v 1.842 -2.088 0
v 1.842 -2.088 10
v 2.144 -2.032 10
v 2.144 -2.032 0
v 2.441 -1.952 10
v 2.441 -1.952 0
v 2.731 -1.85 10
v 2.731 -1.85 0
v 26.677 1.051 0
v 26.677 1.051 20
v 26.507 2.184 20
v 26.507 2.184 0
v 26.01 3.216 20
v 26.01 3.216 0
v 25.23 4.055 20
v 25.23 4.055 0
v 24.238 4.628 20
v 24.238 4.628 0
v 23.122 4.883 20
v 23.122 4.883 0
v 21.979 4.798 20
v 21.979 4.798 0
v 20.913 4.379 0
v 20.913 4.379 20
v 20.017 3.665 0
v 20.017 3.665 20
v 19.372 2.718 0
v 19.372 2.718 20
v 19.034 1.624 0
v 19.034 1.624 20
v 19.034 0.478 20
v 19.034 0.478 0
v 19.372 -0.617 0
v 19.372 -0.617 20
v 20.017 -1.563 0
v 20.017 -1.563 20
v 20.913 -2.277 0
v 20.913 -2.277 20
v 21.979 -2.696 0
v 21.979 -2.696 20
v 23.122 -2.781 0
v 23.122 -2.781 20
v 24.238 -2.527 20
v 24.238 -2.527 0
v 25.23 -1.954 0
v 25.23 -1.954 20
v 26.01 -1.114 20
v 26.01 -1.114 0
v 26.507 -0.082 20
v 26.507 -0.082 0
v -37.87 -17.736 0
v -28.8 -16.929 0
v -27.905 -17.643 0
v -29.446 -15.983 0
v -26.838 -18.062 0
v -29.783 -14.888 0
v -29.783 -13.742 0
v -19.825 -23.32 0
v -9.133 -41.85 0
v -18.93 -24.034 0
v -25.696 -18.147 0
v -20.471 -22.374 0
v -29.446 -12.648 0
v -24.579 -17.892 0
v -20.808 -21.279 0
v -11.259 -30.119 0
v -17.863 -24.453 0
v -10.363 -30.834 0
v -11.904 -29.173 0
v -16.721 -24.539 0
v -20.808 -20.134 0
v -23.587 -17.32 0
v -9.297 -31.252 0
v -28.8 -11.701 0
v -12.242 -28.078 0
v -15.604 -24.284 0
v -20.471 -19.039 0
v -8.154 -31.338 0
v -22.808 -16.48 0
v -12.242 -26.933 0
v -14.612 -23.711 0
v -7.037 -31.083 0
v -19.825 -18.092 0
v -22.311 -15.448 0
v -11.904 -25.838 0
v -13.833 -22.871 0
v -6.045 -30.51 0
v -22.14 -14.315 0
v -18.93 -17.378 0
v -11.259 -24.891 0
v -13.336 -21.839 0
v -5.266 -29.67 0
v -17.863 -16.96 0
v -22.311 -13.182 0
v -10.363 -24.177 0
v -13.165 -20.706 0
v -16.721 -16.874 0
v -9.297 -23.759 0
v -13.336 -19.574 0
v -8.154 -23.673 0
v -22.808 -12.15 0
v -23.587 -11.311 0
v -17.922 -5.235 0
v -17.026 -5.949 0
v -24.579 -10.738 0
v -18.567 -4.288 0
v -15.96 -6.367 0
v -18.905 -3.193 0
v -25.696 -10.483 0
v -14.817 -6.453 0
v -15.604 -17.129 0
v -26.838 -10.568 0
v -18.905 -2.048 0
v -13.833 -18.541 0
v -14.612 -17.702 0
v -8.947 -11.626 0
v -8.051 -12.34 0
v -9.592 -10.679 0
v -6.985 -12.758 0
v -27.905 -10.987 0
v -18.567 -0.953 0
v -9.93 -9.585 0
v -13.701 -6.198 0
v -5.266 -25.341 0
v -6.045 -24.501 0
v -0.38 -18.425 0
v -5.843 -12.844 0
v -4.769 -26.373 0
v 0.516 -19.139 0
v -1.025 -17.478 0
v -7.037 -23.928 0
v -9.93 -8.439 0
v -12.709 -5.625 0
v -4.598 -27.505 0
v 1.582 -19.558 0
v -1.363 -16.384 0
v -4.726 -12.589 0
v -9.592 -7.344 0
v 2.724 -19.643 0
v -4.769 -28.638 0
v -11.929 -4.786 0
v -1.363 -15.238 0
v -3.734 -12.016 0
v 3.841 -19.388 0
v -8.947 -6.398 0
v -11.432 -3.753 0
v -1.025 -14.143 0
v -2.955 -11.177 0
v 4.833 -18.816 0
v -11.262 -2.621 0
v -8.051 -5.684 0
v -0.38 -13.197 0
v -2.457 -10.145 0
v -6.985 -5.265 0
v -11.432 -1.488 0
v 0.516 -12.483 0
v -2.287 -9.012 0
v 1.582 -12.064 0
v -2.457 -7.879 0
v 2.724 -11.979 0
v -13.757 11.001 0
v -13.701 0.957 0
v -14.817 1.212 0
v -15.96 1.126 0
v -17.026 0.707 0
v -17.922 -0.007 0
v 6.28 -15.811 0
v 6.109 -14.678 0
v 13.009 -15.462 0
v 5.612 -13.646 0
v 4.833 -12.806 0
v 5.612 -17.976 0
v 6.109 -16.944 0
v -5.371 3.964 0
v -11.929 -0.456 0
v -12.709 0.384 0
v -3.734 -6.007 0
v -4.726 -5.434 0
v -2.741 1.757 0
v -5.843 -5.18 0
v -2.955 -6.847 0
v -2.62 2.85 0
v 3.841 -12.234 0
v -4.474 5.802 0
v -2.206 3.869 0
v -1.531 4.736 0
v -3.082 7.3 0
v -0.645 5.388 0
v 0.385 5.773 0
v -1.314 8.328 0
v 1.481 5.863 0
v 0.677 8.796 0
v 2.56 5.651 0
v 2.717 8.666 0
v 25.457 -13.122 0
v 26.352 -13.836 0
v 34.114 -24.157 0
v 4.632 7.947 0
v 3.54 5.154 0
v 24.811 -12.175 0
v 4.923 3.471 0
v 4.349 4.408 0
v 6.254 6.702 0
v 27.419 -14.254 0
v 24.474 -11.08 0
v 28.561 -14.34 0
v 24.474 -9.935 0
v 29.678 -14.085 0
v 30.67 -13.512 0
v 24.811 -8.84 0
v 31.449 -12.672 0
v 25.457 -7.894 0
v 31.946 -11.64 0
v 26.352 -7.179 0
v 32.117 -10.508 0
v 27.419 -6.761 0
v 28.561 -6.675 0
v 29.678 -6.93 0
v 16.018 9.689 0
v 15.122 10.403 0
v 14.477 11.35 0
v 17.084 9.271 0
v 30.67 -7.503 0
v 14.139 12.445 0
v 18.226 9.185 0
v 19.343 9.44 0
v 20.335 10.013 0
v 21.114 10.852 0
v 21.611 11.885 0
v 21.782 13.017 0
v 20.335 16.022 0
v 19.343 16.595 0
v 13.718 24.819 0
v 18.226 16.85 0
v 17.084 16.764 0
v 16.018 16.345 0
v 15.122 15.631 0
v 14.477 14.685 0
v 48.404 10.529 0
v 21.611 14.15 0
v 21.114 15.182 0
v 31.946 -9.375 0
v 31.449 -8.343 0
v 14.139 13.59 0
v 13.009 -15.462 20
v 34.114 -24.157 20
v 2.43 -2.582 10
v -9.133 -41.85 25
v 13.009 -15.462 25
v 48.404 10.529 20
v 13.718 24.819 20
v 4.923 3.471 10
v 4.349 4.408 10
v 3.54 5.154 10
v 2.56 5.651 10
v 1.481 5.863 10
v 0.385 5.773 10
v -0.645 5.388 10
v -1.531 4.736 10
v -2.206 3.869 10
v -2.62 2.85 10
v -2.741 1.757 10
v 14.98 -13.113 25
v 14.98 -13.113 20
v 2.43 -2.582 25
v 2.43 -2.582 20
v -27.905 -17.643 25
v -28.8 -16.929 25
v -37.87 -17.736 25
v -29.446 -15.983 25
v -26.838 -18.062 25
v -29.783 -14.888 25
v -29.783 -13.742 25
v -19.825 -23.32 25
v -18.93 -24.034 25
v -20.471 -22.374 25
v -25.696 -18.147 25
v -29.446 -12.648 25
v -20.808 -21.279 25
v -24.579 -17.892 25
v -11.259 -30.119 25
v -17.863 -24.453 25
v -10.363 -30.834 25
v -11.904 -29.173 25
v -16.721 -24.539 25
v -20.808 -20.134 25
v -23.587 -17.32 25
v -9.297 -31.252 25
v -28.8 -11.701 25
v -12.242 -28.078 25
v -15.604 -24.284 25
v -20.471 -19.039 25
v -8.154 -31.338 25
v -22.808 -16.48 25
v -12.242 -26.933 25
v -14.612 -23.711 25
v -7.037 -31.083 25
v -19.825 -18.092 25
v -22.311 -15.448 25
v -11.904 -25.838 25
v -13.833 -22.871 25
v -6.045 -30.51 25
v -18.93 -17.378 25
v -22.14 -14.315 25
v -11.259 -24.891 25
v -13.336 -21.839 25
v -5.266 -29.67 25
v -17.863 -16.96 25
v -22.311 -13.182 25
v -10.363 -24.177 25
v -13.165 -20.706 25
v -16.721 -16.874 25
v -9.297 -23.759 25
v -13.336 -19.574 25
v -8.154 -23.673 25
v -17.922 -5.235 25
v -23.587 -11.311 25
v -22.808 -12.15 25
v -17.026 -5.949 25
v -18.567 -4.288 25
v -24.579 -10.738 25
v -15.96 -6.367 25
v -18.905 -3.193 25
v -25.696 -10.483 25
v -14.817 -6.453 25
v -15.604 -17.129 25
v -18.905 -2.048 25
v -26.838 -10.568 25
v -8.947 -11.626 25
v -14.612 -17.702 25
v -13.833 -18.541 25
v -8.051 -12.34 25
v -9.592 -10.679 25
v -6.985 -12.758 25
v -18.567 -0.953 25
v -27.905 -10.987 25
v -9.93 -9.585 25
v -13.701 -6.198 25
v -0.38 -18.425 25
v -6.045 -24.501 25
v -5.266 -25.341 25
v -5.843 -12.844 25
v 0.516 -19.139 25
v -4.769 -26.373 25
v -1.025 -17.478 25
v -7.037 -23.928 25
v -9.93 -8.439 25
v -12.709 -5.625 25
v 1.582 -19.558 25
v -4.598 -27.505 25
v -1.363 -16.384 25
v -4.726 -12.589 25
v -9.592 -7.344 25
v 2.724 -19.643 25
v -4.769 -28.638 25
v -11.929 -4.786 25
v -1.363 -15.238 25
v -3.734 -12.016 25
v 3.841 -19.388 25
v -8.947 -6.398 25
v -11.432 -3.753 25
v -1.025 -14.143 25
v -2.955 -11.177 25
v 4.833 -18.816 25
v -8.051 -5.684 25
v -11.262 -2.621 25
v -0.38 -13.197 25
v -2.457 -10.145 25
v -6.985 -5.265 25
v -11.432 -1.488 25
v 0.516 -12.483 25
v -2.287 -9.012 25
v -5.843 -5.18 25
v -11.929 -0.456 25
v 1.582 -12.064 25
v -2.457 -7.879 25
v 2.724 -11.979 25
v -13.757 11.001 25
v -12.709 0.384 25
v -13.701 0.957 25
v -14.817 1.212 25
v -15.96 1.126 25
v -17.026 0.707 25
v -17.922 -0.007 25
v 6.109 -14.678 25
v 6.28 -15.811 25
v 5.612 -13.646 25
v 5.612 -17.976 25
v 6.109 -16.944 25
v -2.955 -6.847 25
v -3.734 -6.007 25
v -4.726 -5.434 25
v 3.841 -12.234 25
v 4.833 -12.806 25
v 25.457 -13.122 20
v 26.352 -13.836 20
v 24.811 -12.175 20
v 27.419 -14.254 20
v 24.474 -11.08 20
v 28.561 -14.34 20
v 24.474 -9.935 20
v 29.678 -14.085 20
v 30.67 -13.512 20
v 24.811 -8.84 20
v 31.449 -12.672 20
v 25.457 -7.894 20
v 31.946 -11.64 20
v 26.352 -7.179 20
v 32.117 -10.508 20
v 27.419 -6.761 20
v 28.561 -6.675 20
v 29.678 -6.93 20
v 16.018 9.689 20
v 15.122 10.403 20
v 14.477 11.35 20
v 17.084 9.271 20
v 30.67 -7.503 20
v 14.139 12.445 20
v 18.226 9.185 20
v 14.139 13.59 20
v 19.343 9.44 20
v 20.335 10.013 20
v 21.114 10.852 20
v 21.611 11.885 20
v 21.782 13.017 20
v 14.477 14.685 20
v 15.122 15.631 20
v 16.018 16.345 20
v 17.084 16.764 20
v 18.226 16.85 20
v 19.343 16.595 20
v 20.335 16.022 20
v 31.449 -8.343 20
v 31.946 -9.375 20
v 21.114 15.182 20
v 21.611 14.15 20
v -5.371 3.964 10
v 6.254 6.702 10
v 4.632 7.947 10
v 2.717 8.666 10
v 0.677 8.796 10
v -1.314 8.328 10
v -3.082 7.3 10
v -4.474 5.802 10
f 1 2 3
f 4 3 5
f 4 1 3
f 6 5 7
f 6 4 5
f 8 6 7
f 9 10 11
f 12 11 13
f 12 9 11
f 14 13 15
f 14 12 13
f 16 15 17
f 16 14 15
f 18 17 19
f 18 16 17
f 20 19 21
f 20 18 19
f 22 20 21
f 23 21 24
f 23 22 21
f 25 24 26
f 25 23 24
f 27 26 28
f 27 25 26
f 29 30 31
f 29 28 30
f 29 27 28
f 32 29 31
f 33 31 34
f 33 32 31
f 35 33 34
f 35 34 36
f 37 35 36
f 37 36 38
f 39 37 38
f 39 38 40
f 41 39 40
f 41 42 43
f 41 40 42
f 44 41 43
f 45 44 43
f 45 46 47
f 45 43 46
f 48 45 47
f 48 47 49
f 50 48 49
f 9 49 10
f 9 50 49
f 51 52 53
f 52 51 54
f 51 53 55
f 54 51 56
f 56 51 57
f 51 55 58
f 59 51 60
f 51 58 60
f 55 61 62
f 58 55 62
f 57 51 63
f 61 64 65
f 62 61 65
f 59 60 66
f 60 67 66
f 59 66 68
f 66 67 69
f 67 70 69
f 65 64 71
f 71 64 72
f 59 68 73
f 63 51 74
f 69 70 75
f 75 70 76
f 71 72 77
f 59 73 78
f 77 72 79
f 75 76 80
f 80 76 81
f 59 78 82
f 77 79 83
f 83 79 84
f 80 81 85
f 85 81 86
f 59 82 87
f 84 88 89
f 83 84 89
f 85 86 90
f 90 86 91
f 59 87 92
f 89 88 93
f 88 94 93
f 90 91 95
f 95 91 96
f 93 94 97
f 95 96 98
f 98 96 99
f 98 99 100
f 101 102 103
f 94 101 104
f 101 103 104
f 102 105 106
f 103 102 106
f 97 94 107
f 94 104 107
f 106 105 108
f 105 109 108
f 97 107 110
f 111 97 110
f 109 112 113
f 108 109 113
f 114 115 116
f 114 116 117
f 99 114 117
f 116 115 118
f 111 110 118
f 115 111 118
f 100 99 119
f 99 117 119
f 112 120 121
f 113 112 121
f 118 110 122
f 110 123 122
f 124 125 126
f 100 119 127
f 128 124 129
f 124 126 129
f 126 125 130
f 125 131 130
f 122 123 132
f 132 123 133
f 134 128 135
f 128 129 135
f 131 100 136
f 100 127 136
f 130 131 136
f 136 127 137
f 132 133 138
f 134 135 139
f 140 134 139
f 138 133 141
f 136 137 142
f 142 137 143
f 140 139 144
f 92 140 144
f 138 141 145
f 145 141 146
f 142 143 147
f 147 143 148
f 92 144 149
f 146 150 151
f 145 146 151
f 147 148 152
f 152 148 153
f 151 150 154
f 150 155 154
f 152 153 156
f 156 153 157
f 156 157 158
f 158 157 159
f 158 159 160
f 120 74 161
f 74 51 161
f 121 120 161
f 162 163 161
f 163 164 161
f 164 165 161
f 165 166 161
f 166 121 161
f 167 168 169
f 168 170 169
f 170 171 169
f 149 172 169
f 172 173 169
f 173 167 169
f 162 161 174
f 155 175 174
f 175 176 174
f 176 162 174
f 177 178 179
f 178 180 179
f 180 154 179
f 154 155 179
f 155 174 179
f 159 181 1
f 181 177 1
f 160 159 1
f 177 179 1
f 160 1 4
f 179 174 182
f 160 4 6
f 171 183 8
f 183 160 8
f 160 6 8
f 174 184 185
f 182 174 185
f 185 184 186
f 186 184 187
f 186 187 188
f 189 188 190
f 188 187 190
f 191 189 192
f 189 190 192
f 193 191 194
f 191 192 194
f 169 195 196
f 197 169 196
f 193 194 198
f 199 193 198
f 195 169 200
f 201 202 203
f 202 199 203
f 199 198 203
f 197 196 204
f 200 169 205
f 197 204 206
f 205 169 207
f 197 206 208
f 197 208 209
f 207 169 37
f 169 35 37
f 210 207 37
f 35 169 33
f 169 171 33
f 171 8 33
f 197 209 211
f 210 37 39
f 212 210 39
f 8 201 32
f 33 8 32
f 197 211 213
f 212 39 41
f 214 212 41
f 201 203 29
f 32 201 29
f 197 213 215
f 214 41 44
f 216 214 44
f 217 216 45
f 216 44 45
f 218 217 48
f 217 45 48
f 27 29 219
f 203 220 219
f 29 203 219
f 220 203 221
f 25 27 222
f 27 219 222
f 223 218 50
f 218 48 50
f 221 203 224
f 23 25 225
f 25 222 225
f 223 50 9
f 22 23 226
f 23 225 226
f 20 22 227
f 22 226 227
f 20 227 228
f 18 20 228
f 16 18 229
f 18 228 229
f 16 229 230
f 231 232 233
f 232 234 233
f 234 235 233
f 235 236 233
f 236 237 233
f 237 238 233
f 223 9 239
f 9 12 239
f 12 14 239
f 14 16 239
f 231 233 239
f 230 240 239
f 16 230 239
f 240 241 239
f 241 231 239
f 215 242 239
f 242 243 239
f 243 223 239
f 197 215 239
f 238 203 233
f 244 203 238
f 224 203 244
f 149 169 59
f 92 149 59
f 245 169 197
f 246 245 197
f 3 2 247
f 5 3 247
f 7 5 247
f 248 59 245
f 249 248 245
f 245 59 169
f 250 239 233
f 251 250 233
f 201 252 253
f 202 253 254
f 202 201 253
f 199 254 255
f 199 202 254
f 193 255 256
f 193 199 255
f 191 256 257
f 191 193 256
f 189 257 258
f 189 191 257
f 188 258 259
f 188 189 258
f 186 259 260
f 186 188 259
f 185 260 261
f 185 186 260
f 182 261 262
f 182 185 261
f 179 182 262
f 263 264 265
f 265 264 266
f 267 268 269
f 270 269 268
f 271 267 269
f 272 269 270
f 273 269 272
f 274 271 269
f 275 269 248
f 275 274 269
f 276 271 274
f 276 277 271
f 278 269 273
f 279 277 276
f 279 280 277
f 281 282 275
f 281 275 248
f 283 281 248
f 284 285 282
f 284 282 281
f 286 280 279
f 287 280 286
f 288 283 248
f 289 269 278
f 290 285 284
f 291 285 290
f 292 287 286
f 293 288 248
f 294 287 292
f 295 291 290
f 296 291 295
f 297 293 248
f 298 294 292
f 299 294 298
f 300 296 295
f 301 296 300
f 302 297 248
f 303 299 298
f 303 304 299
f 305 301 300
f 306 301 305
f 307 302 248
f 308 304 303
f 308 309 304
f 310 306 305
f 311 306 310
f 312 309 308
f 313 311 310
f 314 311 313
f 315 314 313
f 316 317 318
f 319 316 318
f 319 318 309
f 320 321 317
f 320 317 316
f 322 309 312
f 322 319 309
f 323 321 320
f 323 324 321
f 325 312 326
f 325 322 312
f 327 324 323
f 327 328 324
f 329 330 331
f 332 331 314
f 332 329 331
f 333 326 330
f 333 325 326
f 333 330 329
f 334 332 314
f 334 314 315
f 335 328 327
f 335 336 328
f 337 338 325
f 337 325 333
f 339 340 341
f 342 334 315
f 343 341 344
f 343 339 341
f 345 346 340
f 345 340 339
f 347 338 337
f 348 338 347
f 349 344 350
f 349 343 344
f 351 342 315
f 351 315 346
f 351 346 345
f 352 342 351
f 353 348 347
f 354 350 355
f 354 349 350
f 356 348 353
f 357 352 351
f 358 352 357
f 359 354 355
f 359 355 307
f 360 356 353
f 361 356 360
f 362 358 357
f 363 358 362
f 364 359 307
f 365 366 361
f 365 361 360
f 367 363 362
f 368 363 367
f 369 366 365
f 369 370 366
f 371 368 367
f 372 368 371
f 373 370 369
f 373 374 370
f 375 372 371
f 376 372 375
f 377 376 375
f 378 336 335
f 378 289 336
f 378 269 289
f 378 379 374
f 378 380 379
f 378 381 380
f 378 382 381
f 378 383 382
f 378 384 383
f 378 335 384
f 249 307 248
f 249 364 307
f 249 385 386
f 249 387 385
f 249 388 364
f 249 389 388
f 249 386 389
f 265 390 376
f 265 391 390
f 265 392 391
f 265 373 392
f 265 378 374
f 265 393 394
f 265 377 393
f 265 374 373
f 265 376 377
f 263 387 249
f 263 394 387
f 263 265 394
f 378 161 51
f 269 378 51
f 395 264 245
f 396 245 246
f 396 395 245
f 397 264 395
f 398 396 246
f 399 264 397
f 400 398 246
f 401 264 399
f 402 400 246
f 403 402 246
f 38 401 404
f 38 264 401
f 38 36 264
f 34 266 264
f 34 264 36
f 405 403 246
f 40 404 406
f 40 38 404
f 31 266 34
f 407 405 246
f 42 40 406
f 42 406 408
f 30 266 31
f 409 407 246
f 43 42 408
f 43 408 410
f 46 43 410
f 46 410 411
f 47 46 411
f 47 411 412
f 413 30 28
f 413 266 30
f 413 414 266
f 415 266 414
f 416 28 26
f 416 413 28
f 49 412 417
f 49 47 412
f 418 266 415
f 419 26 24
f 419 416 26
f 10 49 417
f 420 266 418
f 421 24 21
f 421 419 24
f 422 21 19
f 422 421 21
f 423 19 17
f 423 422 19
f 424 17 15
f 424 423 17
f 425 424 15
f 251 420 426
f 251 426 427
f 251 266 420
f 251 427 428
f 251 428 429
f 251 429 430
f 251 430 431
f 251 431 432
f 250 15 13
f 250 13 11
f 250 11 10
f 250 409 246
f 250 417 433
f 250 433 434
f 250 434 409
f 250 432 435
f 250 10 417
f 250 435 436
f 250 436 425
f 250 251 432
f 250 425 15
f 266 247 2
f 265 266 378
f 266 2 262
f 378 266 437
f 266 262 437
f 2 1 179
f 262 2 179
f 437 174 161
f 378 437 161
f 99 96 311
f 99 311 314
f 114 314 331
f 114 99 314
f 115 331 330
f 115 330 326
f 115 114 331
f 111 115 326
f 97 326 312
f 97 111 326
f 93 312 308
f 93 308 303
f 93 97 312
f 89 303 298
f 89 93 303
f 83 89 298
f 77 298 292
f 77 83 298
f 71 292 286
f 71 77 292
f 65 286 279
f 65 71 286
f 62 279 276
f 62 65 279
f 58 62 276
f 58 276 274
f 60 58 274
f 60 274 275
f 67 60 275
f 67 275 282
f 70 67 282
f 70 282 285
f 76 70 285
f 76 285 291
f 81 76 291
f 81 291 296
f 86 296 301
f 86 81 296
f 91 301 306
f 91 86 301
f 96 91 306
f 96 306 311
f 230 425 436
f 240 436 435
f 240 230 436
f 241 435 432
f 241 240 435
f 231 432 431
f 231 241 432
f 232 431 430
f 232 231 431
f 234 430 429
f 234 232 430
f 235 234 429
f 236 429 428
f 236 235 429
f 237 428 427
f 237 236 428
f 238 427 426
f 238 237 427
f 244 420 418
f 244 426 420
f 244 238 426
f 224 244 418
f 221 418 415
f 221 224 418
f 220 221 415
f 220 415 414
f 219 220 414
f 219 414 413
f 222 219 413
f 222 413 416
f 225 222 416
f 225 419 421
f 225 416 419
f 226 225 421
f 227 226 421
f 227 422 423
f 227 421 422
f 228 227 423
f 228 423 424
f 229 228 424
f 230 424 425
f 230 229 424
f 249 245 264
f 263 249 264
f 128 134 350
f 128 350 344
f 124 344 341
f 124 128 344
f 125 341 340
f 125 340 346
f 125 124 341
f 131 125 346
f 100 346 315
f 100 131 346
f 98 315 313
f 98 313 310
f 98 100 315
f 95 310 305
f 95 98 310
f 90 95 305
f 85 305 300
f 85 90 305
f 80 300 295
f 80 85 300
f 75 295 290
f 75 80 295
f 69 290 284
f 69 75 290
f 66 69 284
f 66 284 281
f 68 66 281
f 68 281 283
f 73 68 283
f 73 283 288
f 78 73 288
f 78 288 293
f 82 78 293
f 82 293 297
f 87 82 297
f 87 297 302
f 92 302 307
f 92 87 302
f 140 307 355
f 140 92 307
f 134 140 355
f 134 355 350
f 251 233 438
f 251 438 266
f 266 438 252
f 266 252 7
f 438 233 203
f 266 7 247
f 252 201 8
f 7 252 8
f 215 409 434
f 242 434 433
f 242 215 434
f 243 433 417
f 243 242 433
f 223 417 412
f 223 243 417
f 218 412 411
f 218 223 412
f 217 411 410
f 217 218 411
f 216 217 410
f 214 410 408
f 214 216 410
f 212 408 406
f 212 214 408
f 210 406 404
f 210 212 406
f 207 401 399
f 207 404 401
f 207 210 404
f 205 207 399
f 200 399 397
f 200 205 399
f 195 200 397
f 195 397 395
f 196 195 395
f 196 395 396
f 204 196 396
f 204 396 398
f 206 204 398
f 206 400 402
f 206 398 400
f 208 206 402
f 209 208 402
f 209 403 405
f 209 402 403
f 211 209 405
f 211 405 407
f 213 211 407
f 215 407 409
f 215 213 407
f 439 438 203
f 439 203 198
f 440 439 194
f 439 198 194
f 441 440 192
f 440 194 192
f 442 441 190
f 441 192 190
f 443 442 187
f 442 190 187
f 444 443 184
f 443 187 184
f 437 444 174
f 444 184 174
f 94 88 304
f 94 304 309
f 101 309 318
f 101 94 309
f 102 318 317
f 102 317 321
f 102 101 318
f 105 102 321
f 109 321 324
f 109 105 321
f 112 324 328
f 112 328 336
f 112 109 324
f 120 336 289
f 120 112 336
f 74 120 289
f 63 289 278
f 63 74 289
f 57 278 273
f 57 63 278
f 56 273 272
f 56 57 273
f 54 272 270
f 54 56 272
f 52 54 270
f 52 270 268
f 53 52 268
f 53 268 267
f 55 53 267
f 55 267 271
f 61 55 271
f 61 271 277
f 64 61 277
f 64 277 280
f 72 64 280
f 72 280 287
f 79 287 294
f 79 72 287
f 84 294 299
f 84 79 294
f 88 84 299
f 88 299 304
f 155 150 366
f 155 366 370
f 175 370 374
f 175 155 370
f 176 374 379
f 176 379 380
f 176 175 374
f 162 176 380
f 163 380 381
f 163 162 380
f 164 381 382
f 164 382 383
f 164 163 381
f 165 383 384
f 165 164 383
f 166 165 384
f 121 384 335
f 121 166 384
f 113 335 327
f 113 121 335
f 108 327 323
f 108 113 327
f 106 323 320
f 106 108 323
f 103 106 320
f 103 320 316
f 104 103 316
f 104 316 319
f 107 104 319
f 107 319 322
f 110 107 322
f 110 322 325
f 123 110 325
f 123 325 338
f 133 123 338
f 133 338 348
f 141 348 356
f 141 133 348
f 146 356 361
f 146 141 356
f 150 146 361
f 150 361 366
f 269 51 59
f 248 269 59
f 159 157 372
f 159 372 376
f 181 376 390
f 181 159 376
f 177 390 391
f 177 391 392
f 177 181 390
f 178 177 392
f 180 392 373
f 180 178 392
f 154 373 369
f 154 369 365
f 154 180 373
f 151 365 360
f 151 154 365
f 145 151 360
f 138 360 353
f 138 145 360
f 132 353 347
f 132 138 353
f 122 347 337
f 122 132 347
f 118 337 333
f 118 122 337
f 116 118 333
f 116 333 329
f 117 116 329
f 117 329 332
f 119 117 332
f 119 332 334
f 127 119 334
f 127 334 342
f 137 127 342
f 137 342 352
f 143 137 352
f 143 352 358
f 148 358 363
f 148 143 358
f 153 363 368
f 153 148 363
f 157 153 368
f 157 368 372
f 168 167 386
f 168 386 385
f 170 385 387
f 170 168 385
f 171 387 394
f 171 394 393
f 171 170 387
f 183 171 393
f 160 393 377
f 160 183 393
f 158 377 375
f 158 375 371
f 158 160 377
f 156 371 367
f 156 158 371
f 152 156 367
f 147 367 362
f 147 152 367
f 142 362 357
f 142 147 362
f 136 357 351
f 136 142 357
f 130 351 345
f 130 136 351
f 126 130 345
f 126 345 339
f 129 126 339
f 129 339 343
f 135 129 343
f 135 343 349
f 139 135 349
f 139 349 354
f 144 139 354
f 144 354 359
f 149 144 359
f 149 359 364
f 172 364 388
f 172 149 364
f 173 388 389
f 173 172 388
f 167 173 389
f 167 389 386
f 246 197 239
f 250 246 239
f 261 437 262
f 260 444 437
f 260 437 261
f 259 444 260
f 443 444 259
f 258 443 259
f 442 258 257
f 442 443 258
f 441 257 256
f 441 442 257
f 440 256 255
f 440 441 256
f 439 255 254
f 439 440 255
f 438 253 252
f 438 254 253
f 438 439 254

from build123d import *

# Parameters (mm, degrees)
F1_DEPTH = 25
F2_DEPTH = 20
F3_R     = 3.843017
F4_DEPTH = 25
F5_R     = 6.951677
F5_R_2   = 4
F6_DEPTH = 10


with BuildPart() as f1:
    # F0 (on Top) → F1 (new body)
    with BuildSketch(Plane.XY):
        Polygon((14.980248, -13.11259), (2.429798, -2.581512), (-0.571601, -9.866924), (13.009035, -15.46179), align=None)
        Polygon((2.429798, -2.581512), (-13.757027, 11.000847), (-37.870464, -17.736428), (-9.133189, -41.849865), (13.009035, -15.46179), (-0.571601, -9.866924), align=None)
    extrude(amount=F1_DEPTH)

    # F0 (on Top) → F2 (join)
    with BuildSketch(Plane.XY):
        Polygon((13.717991, 24.818756), (2.429798, -2.581512), (14.980248, -13.11259), (13.009035, -15.46179), (34.114079, -24.156516), (48.403671, 10.529164), align=None)
    extrude(amount=F2_DEPTH)

    # F3 (on Top) → F4 (cut)
    with BuildSketch(Plane.XY):
        with Locations((-15.104588, -2.620658)):
            Circle(F3_R)
        with Locations((-25.983153, -14.315117)):
            Circle(F3_R)
        with Locations((-6.129771, -9.011817)):
            Circle(F3_R)
        with Locations((-17.008336, -20.706276)):
            Circle(F3_R)
        with Locations((2.437101, -15.810922)):
            Circle(F3_R)
        with Locations((-8.441464, -27.50538)):
            Circle(F3_R)
        with Locations((17.939058, 13.017283)):
            Circle(F3_R)
        with Locations((22.834416, 1.050857)):
            Circle(F3_R)
        with Locations((28.273696, -10.507619)):
            Circle(F3_R)
    extrude(amount=F4_DEPTH, mode=Mode.SUBTRACT)

    # F5 (on Top) → F6 (join)
    with BuildSketch(Plane.XY):
        with Locations((1.257815, 1.869077)):
            Circle(F5_R)
        with Locations((1.257815, 1.869077)):
            Circle(F5_R_2, mode=Mode.SUBTRACT)
    extrude(amount=F6_DEPTH)


solid = f1.part
